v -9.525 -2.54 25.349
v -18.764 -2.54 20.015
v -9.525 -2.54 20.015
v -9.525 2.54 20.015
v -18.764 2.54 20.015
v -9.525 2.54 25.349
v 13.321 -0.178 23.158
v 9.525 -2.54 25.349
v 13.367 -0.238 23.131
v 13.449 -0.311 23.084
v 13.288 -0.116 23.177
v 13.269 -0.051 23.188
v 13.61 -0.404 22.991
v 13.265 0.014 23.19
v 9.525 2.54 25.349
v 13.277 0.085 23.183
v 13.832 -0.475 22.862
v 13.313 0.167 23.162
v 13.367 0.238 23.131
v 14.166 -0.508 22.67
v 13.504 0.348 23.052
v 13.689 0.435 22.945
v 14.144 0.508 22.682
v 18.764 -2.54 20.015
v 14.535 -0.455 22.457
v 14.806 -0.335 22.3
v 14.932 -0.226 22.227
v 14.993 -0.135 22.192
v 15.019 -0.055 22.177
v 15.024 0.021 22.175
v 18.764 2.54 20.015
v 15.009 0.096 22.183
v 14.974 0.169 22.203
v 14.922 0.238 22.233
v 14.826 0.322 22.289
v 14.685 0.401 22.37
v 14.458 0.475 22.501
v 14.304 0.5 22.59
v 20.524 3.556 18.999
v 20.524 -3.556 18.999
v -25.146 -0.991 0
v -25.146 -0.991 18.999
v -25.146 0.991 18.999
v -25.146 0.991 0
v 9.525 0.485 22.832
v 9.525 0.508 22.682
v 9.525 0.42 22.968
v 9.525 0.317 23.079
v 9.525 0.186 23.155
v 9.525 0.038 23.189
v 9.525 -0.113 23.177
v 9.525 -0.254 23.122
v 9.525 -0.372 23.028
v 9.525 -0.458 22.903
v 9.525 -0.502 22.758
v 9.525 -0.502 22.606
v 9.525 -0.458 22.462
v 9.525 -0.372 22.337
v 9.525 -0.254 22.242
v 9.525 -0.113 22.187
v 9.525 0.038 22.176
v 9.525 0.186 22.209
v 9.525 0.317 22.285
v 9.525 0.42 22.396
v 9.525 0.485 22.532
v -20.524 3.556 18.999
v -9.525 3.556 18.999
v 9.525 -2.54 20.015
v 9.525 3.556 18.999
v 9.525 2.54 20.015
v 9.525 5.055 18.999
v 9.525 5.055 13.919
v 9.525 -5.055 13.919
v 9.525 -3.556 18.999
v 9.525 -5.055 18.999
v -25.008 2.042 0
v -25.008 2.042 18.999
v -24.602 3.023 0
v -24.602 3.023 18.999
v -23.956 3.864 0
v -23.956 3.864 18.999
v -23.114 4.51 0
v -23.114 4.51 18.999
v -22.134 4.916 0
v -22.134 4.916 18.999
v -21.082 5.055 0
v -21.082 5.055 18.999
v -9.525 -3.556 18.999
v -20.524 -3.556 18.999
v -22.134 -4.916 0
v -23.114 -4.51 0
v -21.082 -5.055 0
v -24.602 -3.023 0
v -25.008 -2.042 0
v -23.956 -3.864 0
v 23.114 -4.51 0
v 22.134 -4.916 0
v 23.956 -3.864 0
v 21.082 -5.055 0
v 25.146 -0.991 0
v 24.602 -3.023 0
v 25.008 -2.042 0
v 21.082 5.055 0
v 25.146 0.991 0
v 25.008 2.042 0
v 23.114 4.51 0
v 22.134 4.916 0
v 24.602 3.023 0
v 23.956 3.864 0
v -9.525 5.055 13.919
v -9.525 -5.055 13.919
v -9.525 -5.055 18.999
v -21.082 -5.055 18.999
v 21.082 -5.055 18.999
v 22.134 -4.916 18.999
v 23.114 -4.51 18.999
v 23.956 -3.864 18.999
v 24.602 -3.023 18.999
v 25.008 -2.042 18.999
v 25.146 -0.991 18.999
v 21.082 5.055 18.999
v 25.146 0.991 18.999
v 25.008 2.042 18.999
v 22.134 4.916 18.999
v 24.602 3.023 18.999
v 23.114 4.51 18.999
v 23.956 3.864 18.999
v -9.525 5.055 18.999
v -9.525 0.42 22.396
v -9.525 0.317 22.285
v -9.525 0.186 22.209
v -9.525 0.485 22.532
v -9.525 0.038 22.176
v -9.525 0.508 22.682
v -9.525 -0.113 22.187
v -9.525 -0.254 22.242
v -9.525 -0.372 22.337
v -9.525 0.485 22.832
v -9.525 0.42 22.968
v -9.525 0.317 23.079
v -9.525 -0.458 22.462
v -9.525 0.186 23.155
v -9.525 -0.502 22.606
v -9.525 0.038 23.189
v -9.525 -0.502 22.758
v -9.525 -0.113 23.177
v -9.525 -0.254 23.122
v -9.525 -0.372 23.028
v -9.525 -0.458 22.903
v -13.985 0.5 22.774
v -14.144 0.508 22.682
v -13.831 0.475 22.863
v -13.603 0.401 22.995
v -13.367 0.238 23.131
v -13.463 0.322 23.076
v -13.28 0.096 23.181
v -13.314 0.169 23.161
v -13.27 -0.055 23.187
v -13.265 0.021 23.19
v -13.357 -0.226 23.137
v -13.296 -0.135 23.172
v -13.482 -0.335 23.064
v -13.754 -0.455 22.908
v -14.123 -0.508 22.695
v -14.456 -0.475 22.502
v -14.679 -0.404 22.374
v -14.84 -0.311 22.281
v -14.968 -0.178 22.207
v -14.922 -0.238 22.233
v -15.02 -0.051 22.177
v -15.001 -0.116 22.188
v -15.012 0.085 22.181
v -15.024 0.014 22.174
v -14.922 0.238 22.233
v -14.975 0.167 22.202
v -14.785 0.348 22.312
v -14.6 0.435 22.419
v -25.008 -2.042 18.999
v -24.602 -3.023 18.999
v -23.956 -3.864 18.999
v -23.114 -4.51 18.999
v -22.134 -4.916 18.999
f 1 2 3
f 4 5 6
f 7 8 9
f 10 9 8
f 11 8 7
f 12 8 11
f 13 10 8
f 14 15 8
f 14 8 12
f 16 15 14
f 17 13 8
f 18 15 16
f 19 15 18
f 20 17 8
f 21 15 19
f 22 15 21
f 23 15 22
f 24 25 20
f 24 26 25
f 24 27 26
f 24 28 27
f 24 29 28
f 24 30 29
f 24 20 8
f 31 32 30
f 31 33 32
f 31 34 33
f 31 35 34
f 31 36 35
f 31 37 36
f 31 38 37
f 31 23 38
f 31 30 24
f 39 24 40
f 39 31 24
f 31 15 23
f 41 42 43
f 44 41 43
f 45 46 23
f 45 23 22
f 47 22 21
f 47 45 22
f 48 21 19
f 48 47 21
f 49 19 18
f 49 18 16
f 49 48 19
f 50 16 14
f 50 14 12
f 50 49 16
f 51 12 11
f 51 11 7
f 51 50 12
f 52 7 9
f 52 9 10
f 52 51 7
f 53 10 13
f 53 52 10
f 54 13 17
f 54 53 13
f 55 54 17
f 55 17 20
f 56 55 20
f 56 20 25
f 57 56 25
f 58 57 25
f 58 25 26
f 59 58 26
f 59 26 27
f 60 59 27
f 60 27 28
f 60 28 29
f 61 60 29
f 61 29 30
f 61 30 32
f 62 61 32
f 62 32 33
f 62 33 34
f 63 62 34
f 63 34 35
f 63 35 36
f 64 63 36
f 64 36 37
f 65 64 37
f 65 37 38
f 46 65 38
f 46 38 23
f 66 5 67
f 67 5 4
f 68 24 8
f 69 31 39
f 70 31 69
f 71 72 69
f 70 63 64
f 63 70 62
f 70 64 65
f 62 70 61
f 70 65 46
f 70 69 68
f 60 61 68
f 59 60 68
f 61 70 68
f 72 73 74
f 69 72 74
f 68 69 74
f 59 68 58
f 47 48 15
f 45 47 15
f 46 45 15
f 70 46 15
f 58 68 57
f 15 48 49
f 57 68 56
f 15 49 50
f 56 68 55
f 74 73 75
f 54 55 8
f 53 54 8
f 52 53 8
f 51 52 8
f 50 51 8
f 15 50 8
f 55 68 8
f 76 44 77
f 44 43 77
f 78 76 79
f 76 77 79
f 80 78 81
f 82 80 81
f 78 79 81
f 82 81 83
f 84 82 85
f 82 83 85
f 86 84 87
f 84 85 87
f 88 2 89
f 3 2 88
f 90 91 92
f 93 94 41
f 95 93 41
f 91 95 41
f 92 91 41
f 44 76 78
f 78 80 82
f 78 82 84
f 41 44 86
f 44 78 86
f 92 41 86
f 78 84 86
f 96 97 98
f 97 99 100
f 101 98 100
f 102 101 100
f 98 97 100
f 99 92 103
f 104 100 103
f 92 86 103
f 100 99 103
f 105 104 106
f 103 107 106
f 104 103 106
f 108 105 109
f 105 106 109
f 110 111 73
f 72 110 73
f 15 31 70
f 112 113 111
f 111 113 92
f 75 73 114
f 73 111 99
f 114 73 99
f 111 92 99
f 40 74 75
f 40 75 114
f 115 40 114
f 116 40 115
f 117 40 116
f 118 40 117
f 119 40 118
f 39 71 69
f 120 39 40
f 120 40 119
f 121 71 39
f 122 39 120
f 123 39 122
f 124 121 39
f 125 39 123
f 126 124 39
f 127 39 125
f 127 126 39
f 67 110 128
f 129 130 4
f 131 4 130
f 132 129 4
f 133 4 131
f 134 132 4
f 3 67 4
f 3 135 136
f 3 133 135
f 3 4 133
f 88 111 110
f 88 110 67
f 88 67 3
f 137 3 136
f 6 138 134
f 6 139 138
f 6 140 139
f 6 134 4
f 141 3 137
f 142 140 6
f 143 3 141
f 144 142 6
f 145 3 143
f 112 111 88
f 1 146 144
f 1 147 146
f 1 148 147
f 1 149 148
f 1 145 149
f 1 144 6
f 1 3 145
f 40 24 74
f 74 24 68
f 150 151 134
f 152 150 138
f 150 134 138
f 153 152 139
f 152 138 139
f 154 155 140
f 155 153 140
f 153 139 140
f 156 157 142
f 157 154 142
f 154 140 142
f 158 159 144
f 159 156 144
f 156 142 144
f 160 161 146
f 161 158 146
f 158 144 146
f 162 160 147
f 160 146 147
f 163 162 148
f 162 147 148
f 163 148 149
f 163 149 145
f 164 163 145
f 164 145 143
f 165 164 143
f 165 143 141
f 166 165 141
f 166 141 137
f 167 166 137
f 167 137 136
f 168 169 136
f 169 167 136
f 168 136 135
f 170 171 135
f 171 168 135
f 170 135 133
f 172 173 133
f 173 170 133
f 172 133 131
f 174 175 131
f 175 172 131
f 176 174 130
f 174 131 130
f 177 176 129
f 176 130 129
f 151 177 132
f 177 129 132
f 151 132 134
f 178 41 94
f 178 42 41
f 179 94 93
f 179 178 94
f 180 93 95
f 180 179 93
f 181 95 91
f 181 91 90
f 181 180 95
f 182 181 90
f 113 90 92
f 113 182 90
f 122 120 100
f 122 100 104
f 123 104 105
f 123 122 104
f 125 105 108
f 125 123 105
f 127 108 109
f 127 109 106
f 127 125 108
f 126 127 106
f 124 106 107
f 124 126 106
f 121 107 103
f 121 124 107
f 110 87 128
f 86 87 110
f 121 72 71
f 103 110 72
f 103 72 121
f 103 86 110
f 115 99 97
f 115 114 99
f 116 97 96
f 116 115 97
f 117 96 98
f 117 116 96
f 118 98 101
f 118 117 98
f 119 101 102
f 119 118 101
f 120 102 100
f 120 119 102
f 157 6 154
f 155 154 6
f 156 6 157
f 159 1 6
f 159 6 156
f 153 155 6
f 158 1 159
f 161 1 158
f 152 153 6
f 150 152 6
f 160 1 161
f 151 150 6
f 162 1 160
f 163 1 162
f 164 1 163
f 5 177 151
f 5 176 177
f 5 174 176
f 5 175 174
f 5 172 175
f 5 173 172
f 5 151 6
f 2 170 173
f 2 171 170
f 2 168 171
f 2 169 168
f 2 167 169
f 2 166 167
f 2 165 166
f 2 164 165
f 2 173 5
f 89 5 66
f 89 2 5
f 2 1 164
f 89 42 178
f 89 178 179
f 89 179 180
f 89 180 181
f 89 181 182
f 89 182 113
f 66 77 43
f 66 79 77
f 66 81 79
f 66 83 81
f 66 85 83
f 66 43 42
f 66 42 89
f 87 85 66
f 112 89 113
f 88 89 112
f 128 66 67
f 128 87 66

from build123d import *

# Parameters (mm, degrees)
SKETCH_W             = 50.292
SKETCH_H             = 10.1092
PAD_DEPTH            = 18.9992
FILLET_R             = 4.064
SKETCH001_W          = 19.05
SKETCH001_H          = 5.08
POCKET_DEPTH         = 10.1102
PAD001_DEPTH         = 2.54
CHAMFER_SIZE         = 1.016
SKETCH003_R          = 0.508
POCKET001_DEPTH      = 25.147
POCKET001_DEPTH_BACK = -25.147


with BuildPart() as part:
    # Sketch → Pad (new body)
    with BuildSketch(Plane.XY):
        Rectangle(SKETCH_W, SKETCH_H)
    extrude(amount=PAD_DEPTH)

    # Fillet
    fillet_edges = [part.edges().sort_by_distance(p)[0] for p in [
        (-25.146, -5.0546, 9.4996),
        (25.146, -5.0546, 9.4996),
        (25.146, 5.0546, 9.4996),
        (-25.146, 5.0546, 9.4996),
    ]]
    fillet(fillet_edges, radius=FILLET_R)

    # Sketch001 (on Face10 of Fillet) → Pocket (cut, through all)
    with BuildSketch(Plane.XZ.offset(5.0546)):
        with Locations((0, 16.4592)):
            Rectangle(SKETCH001_W, SKETCH001_H)
    extrude(amount=-POCKET_DEPTH, mode=Mode.SUBTRACT)

    # Sketch002 → Pad001 (join, symmetric)
    with BuildSketch(Plane.XZ):
        Polygon((9.525, 18.9992), (9.525, 25.3492), (20.523523, 18.9992), align=None)
        Polygon((-9.525, 18.9992), (-9.525, 25.3492), (-20.523523, 18.9992), align=None)
    extrude(amount=PAD001_DEPTH, both=True)

    # Chamfer
    chamfer_edges = [part.edges().sort_by_distance(p)[0] for p in [
        (-15.024261, -2.54, 18.9992),
        (15.024261, -2.54, 18.9992),
        (-15.024261, 2.54, 18.9992),
        (15.024261, 2.54, 18.9992),
    ]]
    chamfer(chamfer_edges, length=CHAMFER_SIZE)

    # Sketch003 → Pocket001 (cut, two sides)
    with BuildSketch(Plane.YZ) as pocket001_sk:
        with Locations((0, 22.6822)):
            Circle(SKETCH003_R)
    extrude(amount=-POCKET001_DEPTH, mode=Mode.SUBTRACT)
    extrude(pocket001_sk.sketch, amount=-POCKET001_DEPTH_BACK, mode=Mode.SUBTRACT)


solid = part.part
